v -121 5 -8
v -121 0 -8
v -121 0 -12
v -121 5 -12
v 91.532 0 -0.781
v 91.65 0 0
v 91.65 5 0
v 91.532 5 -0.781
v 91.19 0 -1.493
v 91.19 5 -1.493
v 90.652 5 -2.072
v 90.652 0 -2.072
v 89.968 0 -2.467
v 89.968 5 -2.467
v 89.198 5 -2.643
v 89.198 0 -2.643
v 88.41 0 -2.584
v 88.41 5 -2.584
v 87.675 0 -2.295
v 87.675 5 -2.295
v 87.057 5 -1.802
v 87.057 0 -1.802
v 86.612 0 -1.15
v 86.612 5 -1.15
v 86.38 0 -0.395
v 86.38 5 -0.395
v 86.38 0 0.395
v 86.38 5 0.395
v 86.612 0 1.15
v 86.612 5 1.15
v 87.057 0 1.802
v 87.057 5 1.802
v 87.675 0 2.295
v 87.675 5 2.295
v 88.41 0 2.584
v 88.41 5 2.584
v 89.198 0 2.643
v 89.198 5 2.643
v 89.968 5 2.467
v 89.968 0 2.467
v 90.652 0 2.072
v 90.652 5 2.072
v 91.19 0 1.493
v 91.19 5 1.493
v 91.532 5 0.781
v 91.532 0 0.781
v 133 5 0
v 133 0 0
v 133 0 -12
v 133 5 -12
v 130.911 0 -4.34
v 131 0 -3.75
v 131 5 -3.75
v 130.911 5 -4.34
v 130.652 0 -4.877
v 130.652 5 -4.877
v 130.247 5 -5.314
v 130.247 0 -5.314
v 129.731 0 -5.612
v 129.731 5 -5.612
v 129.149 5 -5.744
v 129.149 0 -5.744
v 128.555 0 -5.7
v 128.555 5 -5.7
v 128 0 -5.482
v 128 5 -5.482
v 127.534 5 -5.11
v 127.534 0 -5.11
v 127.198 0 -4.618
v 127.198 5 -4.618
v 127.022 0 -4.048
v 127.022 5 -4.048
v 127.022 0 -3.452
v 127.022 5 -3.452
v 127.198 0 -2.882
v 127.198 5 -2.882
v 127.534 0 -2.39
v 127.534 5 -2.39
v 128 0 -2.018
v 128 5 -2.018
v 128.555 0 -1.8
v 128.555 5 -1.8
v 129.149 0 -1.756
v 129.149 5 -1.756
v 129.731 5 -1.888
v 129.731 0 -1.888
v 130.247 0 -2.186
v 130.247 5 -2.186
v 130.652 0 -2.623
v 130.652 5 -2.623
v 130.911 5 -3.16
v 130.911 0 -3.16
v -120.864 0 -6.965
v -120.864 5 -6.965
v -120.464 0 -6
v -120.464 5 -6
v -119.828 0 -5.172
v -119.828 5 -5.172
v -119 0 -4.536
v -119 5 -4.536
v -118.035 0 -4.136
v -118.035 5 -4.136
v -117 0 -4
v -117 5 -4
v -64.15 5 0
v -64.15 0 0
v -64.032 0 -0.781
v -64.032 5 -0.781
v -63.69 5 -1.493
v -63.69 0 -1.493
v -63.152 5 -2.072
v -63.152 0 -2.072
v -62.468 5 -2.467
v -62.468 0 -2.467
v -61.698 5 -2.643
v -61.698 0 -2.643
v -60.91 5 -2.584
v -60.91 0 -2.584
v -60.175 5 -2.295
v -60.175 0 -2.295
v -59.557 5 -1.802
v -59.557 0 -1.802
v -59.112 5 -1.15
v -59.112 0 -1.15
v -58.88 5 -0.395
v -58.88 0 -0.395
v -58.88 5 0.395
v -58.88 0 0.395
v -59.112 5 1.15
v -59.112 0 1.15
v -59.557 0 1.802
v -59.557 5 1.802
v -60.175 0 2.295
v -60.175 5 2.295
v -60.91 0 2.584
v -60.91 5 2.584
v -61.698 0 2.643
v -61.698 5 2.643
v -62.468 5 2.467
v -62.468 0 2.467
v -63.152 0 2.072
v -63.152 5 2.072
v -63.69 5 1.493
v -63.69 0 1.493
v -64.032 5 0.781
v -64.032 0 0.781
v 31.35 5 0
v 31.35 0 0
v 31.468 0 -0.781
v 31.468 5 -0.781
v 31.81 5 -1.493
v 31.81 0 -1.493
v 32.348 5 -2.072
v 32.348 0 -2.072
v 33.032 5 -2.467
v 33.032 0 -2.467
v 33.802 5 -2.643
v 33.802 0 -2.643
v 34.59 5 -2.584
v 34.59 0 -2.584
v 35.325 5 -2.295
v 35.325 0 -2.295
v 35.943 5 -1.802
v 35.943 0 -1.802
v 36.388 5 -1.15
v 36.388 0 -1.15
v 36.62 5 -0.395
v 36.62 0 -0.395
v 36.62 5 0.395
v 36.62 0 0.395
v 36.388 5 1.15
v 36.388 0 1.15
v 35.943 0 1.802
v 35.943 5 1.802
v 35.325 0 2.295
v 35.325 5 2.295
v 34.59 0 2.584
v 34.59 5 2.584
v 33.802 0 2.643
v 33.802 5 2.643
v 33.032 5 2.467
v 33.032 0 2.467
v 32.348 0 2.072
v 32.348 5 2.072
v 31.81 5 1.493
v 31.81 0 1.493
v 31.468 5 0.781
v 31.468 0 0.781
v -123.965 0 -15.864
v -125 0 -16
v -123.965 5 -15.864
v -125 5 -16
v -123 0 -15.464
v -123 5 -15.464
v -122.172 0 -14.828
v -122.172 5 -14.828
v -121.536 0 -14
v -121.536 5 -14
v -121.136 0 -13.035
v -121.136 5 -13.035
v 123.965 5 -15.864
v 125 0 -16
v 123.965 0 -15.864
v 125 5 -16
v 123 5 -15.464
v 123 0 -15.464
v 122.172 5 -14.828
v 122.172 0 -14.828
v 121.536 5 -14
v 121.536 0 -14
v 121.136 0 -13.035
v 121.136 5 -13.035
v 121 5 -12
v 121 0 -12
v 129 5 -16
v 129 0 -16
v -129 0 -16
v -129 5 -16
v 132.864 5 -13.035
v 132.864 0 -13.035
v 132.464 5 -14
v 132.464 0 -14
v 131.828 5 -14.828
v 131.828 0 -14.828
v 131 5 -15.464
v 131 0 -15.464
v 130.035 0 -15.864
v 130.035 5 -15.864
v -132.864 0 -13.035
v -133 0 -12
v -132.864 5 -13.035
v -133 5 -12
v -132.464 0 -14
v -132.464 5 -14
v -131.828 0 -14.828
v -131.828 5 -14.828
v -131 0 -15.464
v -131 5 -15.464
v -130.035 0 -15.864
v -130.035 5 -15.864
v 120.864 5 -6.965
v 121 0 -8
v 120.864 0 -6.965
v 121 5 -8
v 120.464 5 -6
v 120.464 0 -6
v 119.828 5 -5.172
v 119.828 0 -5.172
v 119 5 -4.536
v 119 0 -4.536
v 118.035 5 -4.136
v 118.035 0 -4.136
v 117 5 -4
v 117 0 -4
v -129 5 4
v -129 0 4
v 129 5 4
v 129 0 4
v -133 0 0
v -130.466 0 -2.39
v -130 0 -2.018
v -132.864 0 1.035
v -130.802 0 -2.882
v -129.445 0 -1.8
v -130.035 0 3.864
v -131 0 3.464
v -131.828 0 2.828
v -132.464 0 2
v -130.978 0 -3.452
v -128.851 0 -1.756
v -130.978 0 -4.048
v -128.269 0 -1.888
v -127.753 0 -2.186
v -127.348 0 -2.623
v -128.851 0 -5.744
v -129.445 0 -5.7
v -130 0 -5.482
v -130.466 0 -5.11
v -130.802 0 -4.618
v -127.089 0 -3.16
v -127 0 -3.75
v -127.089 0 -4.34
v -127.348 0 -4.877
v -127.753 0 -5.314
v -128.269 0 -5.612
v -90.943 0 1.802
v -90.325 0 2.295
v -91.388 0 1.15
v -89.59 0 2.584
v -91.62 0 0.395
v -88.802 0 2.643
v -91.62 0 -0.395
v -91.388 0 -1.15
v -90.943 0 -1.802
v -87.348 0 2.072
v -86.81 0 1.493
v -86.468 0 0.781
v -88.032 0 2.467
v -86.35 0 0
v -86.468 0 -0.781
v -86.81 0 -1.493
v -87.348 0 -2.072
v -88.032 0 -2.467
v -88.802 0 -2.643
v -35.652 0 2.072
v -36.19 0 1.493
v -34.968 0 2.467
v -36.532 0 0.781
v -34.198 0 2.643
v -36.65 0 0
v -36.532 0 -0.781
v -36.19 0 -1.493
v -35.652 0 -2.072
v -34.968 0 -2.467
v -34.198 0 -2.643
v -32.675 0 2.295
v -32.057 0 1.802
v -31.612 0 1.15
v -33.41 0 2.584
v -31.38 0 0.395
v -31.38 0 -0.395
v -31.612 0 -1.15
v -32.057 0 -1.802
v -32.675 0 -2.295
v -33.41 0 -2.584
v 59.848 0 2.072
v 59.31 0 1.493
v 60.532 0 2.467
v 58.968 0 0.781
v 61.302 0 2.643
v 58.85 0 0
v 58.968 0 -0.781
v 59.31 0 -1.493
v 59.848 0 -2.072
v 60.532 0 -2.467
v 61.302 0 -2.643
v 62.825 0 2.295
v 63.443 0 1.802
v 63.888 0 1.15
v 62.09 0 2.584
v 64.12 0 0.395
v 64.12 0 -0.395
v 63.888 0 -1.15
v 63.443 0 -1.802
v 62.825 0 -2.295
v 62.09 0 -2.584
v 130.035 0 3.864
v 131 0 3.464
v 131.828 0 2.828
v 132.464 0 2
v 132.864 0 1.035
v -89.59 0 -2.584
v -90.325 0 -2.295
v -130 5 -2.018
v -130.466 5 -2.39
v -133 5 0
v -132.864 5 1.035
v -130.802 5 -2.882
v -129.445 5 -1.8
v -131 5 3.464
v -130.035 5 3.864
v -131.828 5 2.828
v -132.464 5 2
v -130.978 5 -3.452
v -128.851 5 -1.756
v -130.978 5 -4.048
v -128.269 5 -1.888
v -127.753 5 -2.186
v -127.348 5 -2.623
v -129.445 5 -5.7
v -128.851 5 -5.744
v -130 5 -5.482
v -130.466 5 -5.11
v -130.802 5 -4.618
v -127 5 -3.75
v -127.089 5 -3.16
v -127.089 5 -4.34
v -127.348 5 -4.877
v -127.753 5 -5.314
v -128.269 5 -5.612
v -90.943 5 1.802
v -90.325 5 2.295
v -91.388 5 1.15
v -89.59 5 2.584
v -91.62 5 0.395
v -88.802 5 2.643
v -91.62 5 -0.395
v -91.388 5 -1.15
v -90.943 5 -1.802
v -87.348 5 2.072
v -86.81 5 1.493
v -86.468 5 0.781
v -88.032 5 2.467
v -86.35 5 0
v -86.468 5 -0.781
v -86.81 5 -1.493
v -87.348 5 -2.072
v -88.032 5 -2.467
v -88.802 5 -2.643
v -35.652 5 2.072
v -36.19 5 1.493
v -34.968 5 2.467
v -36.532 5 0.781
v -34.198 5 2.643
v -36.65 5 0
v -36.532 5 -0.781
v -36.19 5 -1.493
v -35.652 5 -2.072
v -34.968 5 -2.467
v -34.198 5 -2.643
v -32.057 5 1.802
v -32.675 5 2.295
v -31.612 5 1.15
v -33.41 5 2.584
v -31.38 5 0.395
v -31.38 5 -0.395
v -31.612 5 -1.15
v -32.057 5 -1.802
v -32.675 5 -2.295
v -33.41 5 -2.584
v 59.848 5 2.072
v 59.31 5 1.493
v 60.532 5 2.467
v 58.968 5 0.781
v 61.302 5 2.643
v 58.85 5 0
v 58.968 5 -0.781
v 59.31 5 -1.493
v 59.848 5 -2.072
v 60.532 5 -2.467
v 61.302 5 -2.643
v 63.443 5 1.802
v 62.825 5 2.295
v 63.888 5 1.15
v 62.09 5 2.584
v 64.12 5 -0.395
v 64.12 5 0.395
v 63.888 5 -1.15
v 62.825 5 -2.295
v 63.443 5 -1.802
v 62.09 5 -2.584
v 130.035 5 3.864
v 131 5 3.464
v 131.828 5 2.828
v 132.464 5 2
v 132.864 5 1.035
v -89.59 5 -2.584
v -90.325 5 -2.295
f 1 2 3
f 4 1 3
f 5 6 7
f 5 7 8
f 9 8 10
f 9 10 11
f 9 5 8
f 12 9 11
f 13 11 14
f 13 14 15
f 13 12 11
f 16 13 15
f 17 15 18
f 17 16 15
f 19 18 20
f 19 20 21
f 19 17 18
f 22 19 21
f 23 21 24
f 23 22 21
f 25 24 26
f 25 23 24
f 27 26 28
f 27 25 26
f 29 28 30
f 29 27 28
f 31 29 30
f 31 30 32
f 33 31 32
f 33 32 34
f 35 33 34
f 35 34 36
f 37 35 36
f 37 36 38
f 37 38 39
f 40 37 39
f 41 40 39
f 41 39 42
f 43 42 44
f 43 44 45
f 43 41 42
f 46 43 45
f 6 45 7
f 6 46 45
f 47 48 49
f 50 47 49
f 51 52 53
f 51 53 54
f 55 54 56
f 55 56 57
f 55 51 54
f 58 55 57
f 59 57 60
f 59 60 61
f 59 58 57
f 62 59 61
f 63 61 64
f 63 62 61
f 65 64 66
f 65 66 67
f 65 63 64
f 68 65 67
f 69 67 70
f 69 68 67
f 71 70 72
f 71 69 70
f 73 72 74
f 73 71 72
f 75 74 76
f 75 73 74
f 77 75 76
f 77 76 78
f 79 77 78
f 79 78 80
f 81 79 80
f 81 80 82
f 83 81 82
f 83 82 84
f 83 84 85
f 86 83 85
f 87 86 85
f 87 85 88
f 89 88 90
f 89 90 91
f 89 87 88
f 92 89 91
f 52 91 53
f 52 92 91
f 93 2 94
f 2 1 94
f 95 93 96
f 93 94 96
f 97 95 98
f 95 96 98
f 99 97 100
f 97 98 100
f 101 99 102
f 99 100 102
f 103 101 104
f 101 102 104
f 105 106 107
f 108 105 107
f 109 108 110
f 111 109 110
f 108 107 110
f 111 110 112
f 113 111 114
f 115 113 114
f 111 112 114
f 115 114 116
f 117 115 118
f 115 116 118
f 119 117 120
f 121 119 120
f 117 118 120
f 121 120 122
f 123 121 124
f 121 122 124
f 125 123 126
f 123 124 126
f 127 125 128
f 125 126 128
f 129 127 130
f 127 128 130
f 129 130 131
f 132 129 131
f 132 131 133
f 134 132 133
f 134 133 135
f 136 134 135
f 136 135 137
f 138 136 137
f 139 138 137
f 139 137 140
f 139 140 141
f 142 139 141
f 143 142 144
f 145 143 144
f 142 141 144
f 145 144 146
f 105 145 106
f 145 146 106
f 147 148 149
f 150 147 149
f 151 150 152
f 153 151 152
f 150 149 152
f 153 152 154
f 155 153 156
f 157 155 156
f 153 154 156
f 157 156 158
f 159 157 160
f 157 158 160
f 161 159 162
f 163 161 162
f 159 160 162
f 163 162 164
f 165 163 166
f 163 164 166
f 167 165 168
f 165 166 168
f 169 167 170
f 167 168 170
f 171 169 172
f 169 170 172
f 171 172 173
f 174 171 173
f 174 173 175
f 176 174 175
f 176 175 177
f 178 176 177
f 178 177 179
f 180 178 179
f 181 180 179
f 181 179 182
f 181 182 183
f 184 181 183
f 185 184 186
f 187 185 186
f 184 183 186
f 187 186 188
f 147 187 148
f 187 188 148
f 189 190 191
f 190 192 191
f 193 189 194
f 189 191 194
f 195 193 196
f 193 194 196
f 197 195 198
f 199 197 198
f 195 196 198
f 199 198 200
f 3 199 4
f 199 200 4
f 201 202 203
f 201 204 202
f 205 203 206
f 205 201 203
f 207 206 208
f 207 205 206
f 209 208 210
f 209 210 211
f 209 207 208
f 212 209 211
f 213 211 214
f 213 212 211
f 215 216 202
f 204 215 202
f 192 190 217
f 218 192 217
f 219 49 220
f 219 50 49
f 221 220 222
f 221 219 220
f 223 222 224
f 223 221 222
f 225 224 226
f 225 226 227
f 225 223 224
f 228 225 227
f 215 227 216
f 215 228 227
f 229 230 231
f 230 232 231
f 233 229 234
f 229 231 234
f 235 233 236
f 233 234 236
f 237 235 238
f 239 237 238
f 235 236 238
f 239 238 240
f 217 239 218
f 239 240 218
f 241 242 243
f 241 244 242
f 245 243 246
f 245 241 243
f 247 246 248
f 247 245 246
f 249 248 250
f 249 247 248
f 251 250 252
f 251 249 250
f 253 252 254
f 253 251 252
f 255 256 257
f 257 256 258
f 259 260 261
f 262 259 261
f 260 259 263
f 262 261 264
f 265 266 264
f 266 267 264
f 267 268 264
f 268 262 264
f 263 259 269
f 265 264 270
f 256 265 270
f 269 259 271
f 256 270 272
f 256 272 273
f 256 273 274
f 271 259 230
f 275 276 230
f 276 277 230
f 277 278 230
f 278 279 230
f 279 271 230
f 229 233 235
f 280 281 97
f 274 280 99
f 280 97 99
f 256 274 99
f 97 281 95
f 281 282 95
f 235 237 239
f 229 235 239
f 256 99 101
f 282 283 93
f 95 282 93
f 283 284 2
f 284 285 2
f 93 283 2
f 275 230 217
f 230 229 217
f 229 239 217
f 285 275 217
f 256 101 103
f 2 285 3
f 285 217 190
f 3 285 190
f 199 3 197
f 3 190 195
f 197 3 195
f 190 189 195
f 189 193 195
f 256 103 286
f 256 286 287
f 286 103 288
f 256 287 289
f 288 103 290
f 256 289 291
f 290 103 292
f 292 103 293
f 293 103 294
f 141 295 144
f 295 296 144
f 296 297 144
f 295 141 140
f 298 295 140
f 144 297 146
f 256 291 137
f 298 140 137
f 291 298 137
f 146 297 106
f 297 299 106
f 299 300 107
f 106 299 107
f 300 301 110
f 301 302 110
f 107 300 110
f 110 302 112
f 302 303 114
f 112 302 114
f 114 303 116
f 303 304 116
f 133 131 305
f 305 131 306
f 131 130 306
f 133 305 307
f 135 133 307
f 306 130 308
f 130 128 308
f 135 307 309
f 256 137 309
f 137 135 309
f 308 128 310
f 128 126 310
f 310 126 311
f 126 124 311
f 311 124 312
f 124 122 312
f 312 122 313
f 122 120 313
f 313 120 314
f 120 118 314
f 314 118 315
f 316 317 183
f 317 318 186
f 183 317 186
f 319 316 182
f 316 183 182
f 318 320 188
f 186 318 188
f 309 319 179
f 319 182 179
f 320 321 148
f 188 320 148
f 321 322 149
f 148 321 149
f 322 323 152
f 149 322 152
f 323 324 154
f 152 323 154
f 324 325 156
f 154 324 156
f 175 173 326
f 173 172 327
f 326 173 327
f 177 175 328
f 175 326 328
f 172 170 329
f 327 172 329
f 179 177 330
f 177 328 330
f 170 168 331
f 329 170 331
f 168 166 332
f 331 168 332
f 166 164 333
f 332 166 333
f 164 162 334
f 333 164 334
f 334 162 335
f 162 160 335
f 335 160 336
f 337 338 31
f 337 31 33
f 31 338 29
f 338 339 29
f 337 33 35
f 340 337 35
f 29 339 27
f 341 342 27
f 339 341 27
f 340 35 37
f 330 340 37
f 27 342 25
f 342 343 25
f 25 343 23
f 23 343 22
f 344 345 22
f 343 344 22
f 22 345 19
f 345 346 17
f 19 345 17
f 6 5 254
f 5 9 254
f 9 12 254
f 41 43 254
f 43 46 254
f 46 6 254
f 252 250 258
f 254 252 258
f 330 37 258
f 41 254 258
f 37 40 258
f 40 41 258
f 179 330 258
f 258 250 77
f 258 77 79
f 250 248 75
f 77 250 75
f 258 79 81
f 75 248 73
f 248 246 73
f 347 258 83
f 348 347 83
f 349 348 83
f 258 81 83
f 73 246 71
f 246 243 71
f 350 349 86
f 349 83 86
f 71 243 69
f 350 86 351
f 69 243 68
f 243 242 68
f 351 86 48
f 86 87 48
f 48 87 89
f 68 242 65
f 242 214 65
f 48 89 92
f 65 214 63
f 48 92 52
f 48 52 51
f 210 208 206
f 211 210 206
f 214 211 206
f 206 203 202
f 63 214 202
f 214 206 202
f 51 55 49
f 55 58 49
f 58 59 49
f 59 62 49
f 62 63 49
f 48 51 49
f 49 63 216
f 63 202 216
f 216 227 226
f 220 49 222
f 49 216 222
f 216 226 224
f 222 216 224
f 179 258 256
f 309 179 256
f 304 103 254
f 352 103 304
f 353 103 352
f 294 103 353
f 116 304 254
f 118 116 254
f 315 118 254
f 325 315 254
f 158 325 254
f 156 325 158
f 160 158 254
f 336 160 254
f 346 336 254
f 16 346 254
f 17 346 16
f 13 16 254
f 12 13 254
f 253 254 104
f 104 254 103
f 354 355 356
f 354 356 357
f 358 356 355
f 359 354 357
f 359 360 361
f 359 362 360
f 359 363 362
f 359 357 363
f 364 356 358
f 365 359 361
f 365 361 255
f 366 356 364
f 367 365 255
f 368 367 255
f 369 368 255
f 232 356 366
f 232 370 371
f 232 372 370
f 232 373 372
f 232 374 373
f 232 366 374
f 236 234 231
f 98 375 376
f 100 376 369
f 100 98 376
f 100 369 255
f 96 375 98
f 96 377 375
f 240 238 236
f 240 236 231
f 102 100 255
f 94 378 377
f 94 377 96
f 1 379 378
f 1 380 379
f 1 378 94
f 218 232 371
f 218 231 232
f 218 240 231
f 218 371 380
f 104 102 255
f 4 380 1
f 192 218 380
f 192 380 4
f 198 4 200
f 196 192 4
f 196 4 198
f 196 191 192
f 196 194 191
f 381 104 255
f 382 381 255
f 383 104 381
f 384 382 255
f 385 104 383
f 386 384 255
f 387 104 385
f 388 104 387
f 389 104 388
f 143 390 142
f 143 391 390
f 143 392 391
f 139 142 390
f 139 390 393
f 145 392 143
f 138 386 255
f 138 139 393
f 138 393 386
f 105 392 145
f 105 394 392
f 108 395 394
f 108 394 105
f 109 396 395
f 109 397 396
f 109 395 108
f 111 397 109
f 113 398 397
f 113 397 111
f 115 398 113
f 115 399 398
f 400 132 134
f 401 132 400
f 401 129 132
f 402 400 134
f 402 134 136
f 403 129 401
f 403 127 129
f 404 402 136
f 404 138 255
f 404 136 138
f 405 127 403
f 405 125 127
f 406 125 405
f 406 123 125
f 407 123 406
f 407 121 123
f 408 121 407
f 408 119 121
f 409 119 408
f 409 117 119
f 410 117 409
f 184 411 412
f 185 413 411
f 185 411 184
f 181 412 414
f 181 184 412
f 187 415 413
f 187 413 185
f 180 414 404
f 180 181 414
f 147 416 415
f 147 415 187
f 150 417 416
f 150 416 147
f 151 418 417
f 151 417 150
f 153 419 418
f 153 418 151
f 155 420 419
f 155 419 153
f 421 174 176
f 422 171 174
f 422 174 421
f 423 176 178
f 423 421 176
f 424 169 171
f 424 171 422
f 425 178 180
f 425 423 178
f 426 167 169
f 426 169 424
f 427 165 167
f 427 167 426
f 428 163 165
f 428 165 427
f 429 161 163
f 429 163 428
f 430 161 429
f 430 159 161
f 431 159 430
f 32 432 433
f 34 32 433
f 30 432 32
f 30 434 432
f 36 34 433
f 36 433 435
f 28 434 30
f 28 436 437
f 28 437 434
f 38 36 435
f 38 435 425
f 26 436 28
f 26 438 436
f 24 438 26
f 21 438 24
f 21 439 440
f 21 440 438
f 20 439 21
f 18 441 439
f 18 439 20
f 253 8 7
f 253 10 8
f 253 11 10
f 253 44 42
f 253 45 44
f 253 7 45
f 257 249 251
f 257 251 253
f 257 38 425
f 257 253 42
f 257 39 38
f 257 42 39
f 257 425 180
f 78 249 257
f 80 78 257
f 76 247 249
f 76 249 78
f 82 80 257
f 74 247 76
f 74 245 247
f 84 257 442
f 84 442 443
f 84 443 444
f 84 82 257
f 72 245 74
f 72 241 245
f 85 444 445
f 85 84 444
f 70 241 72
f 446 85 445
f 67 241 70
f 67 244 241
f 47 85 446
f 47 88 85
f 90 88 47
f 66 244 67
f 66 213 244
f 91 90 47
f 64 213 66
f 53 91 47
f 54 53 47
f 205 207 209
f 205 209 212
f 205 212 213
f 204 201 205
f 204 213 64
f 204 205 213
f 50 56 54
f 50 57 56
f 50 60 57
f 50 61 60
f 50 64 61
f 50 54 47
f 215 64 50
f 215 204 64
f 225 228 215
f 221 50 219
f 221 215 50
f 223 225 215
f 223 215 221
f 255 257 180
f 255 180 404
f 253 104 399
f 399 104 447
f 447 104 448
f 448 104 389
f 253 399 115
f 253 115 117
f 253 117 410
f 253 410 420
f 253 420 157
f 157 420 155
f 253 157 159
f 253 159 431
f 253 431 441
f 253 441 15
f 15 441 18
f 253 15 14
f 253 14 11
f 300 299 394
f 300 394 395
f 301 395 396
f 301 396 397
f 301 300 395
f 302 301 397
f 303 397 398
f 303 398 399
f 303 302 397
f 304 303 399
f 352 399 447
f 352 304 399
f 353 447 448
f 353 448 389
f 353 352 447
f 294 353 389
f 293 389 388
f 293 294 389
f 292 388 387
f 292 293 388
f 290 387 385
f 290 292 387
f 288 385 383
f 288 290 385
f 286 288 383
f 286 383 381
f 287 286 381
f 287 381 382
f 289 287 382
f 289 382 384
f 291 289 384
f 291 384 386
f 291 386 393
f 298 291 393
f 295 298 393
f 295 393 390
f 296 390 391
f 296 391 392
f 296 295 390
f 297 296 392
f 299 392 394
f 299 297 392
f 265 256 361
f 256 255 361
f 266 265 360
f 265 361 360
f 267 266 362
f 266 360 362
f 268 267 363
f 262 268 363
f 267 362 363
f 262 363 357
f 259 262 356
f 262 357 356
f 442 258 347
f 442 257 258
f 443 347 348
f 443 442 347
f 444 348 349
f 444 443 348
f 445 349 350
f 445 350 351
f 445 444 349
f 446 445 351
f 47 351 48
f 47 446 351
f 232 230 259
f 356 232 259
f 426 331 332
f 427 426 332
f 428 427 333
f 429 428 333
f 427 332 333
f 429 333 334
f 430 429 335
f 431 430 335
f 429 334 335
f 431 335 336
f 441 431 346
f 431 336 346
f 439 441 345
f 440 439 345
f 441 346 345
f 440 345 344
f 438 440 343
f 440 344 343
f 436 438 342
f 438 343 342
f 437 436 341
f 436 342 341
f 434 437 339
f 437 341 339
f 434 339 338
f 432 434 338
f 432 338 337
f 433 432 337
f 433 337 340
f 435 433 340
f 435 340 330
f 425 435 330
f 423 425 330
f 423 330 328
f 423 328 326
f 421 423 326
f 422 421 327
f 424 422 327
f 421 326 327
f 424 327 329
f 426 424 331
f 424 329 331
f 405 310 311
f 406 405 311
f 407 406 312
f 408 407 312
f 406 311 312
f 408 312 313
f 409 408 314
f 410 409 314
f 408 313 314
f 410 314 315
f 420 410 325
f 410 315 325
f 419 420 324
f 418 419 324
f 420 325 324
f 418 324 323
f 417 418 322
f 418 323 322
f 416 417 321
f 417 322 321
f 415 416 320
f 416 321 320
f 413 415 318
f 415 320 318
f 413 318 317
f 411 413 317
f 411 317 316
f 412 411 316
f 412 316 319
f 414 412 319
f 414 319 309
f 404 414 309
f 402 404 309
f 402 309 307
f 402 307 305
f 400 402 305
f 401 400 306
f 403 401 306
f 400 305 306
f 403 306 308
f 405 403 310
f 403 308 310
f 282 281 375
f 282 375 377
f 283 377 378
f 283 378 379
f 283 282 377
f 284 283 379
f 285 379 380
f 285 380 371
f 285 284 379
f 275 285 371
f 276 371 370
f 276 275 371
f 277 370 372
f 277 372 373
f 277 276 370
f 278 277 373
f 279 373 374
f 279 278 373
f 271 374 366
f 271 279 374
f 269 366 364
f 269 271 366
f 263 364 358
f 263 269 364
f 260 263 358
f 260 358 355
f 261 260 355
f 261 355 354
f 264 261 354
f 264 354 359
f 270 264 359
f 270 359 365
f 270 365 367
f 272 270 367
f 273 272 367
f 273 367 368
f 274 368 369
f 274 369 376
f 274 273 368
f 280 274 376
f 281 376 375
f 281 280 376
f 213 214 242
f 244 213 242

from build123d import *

# Parameters (mm, degrees)
SKETCH_1_R      = 2
SKETCH_1_R_2    = 2.65
EXTRUDE_1_DEPTH = 5
FILLET_1_R      = 4


with BuildPart() as part:
    # 草图1 → 凸台-拉伸1 (new body)
    with BuildSketch(Plane(origin=(0, 0, 0), x_dir=(1, 0, 0), z_dir=(0, 1, 0))):
        Polygon((-133, -4), (133, -4), (133, 16), (121, 16), (121, 4), (-121, 4), (-121, 16), (-133, 16), align=None)
        with Locations((129, 3.75)):
            Circle(SKETCH_1_R, mode=Mode.SUBTRACT)
        with Locations((-89, 0)):
            Circle(SKETCH_1_R_2, mode=Mode.SUBTRACT)
        with BuildLine():
            ThreePointArc((-58.85, 0), (-61.5, -2.65), (-64.15, 0))
            ThreePointArc((-64.15, 0), (-61.5, 2.65), (-58.85, 0))
        make_face(mode=Mode.SUBTRACT)
        with BuildLine():
            ThreePointArc((-31.35, 0), (-34, -2.65), (-36.65, 0))
            ThreePointArc((-36.65, 0), (-34, 2.65), (-31.35, 0))
        make_face(mode=Mode.SUBTRACT)
        with BuildLine():
            ThreePointArc((36.65, 0), (34, -2.65), (31.35, 0))
            ThreePointArc((31.35, 0), (34, 2.65), (36.65, 0))
        make_face(mode=Mode.SUBTRACT)
        with BuildLine():
            ThreePointArc((64.15, 0), (61.5, -2.65), (58.85, 0))
            ThreePointArc((58.85, 0), (61.5, 2.65), (64.15, 0))
        make_face(mode=Mode.SUBTRACT)
        with Locations((89, 0)):
            Circle(SKETCH_1_R_2, mode=Mode.SUBTRACT)
        with Locations((-129, 3.75)):
            Circle(SKETCH_1_R, mode=Mode.SUBTRACT)
    extrude(amount=EXTRUDE_1_DEPTH)

    # 圆角1
    fillet_1_edges = [part.edges().sort_by_distance(p)[0] for p in [
        (-133, 2.5, -16),
        (-121, 2.5, -16),
        (-121, 2.5, -4),
        (121, 2.5, -4),
        (121, 2.5, -16),
        (133, 2.5, -16),
        (133, 2.5, 4),
        (-133, 2.5, 4),
    ]]
    fillet(fillet_1_edges, radius=FILLET_1_R)


solid = part.part
